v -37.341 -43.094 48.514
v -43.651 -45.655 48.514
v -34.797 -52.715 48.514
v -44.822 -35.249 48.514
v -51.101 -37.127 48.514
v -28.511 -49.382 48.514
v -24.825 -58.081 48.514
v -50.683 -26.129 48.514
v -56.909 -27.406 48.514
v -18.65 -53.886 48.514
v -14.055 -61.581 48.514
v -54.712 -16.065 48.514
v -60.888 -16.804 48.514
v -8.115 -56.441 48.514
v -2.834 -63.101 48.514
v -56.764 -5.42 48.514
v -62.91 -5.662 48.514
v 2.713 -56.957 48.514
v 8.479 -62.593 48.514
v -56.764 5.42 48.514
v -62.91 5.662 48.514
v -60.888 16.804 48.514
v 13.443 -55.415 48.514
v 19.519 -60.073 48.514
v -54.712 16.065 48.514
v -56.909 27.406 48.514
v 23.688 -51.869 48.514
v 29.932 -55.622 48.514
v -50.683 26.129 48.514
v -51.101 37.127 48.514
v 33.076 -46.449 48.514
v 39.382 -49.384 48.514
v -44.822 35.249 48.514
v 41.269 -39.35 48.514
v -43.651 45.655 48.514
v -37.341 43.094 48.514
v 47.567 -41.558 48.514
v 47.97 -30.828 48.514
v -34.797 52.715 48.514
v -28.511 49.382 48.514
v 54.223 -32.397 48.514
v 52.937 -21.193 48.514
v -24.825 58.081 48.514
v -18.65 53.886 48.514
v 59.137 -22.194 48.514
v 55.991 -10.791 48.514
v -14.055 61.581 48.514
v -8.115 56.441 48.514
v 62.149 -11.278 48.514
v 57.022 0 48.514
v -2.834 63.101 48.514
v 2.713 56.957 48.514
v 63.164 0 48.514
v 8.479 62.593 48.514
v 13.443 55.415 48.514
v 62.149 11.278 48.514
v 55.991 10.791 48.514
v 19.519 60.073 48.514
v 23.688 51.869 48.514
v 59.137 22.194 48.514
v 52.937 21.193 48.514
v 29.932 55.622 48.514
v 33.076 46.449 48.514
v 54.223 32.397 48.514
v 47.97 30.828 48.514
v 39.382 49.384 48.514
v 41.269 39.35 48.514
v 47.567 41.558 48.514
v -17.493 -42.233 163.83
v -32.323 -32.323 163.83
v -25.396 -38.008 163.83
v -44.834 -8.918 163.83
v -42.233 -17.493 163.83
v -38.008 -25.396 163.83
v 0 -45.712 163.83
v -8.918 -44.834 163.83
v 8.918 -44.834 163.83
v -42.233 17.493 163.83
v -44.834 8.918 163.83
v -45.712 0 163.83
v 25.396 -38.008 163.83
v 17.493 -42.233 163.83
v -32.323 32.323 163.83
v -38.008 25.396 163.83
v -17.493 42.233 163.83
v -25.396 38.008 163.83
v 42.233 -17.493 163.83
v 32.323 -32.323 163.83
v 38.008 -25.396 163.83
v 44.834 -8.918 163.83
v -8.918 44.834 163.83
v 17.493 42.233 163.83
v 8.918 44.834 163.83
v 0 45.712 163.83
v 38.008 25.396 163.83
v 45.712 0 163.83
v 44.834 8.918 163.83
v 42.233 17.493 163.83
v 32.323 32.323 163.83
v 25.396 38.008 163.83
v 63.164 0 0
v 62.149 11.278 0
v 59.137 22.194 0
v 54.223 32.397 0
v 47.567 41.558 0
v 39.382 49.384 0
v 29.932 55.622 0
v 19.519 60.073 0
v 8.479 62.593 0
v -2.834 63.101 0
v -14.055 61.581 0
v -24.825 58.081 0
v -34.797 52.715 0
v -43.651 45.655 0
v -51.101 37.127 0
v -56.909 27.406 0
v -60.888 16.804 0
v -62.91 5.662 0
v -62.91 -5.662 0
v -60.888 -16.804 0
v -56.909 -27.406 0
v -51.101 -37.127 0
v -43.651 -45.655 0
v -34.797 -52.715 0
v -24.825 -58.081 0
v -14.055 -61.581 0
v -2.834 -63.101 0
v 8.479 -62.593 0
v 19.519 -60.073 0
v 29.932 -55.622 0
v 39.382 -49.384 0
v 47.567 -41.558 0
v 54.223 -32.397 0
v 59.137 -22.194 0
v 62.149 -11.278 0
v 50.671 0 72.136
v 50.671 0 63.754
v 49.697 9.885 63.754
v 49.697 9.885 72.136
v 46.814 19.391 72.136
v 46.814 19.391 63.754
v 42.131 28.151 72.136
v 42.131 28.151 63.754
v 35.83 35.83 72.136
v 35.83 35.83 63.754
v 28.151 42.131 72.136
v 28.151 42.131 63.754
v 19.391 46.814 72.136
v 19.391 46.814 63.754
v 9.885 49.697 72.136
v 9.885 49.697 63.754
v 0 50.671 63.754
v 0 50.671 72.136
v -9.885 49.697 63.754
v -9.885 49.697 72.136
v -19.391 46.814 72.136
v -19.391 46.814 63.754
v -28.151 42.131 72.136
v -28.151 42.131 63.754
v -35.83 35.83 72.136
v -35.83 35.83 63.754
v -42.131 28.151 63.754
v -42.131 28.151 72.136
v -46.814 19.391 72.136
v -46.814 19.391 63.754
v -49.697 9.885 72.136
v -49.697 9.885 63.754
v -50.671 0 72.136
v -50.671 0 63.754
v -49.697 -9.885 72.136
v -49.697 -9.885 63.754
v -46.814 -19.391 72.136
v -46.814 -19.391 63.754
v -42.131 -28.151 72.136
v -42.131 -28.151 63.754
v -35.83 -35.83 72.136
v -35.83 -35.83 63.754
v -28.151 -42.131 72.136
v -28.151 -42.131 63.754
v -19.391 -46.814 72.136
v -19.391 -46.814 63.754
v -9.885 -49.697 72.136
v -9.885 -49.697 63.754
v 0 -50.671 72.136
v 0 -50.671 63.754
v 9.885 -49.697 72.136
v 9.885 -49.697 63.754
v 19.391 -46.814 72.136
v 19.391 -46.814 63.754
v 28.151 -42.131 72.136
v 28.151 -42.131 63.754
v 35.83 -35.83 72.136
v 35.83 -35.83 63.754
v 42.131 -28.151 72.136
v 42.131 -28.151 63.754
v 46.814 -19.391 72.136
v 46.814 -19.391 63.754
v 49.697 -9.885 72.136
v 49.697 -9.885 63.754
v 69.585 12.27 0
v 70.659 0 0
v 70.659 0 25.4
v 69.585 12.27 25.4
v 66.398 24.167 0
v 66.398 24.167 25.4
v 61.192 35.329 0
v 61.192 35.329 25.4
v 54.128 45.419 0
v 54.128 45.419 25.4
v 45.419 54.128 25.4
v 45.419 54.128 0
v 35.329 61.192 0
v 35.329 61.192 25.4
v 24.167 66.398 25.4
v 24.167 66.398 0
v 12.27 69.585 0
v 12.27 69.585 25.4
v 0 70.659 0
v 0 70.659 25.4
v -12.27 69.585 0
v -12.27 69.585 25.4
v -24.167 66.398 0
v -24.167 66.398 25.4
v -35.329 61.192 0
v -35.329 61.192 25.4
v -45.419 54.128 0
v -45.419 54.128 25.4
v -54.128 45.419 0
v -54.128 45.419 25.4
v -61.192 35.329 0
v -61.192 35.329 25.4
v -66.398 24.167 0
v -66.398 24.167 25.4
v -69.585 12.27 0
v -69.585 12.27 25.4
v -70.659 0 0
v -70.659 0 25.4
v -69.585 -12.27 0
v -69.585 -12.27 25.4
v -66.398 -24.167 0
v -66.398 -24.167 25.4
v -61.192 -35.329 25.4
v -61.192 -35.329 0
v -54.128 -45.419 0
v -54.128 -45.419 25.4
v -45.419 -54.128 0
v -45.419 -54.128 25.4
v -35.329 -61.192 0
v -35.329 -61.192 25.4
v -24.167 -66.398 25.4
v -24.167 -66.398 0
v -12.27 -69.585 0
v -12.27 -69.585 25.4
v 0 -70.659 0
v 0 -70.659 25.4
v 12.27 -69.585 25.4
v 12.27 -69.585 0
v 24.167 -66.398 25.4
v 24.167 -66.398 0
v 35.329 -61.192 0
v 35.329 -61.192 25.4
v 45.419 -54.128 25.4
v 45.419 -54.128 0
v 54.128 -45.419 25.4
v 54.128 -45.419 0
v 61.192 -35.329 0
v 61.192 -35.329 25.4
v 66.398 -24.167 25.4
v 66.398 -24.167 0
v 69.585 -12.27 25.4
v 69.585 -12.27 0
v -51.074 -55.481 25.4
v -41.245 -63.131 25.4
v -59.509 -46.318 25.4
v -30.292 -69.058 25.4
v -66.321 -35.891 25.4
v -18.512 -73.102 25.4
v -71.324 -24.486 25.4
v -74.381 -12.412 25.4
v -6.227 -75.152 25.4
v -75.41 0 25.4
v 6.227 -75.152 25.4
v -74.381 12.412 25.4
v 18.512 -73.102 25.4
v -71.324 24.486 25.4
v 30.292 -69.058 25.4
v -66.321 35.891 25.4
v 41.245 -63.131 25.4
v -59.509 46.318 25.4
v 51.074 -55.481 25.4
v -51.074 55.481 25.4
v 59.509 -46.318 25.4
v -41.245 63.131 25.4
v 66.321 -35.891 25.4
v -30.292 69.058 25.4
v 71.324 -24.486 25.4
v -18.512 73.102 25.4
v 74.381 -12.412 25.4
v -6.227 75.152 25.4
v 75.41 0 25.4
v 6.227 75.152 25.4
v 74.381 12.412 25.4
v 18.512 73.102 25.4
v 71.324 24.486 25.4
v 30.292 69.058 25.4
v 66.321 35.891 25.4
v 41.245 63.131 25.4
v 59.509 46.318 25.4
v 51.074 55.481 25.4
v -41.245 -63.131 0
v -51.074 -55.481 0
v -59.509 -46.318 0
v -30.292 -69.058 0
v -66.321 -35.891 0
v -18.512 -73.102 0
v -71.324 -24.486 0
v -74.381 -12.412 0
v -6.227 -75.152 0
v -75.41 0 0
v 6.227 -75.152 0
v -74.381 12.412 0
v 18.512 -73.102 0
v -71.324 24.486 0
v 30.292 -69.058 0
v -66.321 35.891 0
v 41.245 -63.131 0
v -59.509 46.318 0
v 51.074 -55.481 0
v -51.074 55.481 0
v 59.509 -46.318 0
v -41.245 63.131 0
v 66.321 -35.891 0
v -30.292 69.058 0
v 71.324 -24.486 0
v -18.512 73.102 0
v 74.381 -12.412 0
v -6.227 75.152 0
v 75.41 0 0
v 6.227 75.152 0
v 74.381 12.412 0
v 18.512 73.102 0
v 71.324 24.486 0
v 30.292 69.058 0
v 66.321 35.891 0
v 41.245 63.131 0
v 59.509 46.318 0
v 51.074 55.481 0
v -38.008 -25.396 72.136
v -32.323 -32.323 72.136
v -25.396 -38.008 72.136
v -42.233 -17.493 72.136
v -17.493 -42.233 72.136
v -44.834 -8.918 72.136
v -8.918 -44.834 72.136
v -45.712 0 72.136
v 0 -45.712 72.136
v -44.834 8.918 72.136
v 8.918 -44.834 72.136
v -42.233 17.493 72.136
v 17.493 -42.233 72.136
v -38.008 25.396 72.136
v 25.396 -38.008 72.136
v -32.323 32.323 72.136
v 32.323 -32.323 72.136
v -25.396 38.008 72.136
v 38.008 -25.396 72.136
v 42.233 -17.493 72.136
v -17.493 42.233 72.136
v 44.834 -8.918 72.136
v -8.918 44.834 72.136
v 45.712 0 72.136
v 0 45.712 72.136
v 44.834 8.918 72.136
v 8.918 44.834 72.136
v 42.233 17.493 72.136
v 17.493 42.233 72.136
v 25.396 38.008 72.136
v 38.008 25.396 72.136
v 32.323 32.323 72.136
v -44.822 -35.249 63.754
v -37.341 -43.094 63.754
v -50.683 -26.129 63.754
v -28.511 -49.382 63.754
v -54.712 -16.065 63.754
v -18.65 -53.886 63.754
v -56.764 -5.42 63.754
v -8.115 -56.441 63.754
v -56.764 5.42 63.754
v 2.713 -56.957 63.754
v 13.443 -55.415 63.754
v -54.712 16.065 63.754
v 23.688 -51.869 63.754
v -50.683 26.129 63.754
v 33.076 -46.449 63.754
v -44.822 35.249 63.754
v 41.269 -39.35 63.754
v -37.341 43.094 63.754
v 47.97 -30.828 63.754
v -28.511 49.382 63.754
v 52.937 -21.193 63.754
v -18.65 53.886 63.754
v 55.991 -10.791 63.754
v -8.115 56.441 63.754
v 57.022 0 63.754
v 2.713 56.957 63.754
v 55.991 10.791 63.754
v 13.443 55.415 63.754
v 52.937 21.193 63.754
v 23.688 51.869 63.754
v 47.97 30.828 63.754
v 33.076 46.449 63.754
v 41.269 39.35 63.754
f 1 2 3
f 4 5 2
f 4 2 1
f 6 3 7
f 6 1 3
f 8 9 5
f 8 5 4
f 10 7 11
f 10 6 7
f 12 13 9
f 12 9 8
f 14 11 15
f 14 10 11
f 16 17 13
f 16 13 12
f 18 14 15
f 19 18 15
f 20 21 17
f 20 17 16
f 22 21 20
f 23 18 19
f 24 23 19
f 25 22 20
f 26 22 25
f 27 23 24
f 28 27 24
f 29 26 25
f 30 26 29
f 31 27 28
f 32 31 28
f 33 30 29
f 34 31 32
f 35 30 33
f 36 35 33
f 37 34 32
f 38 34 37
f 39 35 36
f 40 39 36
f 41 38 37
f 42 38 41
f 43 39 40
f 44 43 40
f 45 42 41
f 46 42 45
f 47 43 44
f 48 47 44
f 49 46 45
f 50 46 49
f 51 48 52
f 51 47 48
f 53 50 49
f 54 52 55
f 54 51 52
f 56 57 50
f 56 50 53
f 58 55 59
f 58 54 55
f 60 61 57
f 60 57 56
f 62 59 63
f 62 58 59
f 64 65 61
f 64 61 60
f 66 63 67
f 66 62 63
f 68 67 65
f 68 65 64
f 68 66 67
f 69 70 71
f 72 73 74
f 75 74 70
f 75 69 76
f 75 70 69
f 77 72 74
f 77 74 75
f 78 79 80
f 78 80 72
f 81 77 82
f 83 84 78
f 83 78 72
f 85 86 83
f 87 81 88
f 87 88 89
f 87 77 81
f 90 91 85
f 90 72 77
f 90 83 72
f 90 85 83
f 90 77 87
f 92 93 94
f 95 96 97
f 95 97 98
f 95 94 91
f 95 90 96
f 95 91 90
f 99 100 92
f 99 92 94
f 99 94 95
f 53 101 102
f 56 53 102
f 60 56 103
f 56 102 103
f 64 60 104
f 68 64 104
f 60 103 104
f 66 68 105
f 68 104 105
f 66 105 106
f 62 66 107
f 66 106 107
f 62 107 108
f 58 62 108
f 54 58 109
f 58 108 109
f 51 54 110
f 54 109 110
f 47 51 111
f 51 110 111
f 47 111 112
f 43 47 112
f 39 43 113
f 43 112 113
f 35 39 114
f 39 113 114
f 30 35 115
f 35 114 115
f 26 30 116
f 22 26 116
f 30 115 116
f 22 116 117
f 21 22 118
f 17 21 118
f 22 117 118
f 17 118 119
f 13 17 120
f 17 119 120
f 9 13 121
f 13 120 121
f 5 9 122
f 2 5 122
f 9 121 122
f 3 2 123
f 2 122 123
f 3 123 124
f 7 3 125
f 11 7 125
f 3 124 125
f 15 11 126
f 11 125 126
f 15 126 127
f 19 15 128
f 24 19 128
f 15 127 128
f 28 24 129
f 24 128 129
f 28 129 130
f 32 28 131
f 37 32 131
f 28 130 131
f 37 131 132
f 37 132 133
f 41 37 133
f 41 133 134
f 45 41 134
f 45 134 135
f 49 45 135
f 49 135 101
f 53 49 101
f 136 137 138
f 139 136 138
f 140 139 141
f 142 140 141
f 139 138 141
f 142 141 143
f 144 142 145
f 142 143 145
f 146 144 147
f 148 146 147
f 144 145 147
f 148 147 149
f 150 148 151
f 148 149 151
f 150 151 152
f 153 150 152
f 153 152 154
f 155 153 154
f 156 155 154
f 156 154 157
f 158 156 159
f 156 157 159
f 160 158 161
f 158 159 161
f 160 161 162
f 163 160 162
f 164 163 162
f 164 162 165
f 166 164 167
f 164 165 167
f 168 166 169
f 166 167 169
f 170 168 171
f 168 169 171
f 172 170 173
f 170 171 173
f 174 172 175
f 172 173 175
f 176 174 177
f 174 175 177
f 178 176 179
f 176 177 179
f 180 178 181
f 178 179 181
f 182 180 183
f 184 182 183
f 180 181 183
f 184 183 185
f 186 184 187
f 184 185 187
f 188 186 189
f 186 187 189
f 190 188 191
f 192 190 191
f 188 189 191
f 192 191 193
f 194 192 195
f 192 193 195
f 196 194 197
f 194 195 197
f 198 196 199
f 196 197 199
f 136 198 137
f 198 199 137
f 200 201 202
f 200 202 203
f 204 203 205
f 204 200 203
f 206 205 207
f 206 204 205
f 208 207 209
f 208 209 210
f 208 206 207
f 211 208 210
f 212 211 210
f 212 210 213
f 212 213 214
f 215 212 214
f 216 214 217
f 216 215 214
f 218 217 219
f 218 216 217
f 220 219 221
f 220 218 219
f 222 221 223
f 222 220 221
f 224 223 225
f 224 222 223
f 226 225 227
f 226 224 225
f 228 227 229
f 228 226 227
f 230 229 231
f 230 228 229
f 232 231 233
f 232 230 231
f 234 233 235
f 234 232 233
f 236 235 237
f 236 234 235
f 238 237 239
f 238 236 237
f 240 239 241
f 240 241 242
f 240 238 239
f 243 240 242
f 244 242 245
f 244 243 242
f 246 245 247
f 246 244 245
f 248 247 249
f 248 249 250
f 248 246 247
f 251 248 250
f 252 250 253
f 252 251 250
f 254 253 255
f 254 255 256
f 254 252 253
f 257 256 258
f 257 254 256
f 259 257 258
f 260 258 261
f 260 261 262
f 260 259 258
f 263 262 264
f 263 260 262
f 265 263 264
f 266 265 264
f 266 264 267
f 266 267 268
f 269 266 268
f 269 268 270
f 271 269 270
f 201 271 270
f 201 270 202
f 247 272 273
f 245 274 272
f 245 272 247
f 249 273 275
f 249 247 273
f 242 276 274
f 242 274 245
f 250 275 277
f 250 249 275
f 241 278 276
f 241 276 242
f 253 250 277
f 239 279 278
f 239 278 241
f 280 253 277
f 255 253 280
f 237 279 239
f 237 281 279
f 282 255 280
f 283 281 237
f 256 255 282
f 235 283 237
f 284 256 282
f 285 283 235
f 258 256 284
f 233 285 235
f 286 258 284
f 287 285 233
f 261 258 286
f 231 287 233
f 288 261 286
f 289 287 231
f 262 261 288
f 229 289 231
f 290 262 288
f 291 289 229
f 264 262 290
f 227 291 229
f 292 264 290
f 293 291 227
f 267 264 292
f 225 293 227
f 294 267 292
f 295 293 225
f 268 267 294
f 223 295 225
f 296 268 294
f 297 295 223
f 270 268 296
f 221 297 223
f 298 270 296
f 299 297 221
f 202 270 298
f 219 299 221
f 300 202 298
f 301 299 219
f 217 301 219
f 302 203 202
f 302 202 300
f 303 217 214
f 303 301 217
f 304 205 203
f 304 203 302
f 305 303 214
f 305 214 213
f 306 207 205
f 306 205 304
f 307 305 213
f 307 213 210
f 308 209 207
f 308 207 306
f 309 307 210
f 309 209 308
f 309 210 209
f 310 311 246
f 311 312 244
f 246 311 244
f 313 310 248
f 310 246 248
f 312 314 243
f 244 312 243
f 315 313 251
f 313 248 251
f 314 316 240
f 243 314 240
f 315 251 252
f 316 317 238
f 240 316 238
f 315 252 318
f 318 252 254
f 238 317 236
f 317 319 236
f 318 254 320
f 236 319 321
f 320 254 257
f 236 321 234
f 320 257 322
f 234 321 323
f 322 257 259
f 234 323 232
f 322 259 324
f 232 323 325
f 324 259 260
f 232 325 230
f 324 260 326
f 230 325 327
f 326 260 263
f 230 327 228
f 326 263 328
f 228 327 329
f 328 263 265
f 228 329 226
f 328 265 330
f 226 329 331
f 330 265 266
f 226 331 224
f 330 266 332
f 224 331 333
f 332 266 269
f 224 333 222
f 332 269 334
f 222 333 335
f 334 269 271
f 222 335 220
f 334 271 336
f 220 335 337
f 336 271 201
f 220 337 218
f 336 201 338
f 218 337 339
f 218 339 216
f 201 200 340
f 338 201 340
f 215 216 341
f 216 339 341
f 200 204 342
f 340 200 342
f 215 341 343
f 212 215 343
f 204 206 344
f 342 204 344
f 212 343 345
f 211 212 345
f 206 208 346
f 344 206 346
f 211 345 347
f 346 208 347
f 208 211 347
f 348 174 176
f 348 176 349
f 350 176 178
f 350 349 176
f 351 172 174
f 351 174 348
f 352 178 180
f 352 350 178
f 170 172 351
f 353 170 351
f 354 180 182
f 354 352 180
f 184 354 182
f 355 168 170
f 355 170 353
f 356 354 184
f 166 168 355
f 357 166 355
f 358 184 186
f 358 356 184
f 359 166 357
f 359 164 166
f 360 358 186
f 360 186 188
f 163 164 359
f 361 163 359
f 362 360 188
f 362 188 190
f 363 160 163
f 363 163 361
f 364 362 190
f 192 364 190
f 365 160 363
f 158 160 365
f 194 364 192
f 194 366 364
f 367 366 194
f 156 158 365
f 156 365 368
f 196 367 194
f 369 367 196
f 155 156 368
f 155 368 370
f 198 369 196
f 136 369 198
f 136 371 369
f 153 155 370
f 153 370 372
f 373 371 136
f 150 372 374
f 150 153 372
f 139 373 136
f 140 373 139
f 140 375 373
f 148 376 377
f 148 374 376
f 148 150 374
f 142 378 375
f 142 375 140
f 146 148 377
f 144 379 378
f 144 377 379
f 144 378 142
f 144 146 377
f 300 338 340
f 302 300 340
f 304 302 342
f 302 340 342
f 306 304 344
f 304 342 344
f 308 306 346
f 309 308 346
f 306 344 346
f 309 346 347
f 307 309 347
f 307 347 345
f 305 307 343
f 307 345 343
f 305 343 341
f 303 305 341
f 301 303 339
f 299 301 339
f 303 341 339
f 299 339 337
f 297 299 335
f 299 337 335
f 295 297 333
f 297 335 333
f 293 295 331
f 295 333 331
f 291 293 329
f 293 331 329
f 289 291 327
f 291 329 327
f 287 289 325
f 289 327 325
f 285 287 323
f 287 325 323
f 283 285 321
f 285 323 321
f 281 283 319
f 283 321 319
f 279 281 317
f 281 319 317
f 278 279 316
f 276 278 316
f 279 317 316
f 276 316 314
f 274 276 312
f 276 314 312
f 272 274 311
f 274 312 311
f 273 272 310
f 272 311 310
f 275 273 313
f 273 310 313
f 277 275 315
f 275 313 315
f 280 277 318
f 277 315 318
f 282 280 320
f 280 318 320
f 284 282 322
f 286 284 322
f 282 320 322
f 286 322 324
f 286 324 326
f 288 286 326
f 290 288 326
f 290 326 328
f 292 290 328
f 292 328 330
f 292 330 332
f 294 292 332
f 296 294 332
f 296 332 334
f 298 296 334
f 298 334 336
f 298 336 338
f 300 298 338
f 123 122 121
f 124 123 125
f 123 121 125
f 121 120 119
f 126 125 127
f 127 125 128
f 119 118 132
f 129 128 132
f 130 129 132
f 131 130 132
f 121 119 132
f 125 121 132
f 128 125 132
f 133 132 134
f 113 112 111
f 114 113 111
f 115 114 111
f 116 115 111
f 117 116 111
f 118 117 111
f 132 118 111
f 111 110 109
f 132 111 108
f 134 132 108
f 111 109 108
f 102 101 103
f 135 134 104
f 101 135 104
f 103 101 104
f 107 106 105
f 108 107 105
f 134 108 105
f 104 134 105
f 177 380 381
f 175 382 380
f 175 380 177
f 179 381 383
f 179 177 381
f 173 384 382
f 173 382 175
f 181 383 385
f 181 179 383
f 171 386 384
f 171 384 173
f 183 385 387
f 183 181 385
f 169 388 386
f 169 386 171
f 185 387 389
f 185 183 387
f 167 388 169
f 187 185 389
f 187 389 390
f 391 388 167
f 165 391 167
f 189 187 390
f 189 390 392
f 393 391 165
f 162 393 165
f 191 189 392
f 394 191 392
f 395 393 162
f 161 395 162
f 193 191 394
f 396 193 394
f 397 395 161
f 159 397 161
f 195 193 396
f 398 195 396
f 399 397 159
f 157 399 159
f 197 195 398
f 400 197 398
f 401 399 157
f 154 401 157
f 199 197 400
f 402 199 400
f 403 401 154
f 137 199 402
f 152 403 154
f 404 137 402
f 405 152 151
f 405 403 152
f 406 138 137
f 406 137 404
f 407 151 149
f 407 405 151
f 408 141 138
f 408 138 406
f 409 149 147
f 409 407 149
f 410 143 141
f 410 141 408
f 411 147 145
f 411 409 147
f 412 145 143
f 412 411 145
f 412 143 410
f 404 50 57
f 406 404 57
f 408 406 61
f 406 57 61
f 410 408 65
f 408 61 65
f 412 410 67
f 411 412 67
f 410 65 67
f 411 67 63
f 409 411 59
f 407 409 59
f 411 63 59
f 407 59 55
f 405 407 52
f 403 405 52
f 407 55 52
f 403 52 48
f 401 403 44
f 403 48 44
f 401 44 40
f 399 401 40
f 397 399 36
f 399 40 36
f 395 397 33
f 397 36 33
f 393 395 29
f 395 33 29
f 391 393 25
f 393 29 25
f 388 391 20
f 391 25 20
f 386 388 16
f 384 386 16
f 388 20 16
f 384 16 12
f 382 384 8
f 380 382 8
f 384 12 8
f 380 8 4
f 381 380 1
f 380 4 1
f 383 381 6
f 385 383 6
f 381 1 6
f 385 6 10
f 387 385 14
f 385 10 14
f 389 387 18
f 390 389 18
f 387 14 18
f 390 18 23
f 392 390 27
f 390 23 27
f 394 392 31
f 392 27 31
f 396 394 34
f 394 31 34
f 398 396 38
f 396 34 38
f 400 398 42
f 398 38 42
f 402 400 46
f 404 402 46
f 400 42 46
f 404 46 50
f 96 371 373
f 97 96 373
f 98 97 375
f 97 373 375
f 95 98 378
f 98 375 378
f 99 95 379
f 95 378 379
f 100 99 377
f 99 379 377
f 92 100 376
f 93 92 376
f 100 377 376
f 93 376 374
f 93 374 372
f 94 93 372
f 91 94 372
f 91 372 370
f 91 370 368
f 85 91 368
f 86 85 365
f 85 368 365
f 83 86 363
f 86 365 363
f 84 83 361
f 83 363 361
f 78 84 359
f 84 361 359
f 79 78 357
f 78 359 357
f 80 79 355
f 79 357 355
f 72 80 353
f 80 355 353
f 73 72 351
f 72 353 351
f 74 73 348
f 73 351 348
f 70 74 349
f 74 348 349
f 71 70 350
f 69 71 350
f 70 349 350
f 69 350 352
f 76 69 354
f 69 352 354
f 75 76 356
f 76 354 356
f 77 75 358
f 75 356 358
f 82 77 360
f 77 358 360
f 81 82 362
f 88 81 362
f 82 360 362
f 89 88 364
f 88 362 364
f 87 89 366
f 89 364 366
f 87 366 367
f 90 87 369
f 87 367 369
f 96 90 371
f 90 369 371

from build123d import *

# Parameters (mm, degrees)
F0_R        = 75.4098467948
F0_R_2      = 70.6589488297
F1_DEPTH    = 25.4
F1_FACE_R   = 75.4098467948
F1_FACE_R_2 = 70.6589488297
F2_DEPTH    = 25.4
F3_R        = 63.164408374
F4_DEPTH    = 48.514
F5_R        = 57.0218847932
F6_DEPTH    = 15.24
F7_R        = 50.6708794685
F8_DEPTH    = 8.382
F9_R        = 45.7123034212
F10_DEPTH   = 91.694


with BuildPart() as f1:
    # F0 (on Top) → F1 (new body)
    with BuildSketch(Plane.XY):
        Circle(F0_R)
        Circle(F0_R_2, mode=Mode.SUBTRACT)
    extrude(amount=F1_DEPTH)

    # F0 (on Top) + F1_face (on face) → F2 (join)
    with BuildSketch(Plane.XY):
        Circle(F0_R)
        Circle(F0_R_2, mode=Mode.SUBTRACT)
    with BuildSketch(Plane(origin=(0, 0, 0), x_dir=(1, 0, 0), z_dir=(0, 0, -1))):
        Circle(F1_FACE_R)
        Circle(F1_FACE_R_2, mode=Mode.SUBTRACT)
    extrude(amount=F2_DEPTH, dir=(0, 0, 1))


with BuildPart() as f4:
    # F3 (on Top) → F4 (new body)
    with BuildSketch(Plane.XY):
        Circle(F3_R)
    extrude(amount=F4_DEPTH)

    # F5 (on face) → F6 (join)
    with BuildSketch(Plane.XY.offset(48.514)):
        Circle(F5_R)
    extrude(amount=F6_DEPTH)

    # F7 (on face) → F8 (join)
    with BuildSketch(Plane.XY.offset(63.754)):
        Circle(F7_R)
    extrude(amount=F8_DEPTH)

    # F9 (on face) → F10 (join)
    with BuildSketch(Plane.XY.offset(72.136)):
        Circle(F9_R)
    extrude(amount=F10_DEPTH)


solid = Compound([f1.part, f4.part])
